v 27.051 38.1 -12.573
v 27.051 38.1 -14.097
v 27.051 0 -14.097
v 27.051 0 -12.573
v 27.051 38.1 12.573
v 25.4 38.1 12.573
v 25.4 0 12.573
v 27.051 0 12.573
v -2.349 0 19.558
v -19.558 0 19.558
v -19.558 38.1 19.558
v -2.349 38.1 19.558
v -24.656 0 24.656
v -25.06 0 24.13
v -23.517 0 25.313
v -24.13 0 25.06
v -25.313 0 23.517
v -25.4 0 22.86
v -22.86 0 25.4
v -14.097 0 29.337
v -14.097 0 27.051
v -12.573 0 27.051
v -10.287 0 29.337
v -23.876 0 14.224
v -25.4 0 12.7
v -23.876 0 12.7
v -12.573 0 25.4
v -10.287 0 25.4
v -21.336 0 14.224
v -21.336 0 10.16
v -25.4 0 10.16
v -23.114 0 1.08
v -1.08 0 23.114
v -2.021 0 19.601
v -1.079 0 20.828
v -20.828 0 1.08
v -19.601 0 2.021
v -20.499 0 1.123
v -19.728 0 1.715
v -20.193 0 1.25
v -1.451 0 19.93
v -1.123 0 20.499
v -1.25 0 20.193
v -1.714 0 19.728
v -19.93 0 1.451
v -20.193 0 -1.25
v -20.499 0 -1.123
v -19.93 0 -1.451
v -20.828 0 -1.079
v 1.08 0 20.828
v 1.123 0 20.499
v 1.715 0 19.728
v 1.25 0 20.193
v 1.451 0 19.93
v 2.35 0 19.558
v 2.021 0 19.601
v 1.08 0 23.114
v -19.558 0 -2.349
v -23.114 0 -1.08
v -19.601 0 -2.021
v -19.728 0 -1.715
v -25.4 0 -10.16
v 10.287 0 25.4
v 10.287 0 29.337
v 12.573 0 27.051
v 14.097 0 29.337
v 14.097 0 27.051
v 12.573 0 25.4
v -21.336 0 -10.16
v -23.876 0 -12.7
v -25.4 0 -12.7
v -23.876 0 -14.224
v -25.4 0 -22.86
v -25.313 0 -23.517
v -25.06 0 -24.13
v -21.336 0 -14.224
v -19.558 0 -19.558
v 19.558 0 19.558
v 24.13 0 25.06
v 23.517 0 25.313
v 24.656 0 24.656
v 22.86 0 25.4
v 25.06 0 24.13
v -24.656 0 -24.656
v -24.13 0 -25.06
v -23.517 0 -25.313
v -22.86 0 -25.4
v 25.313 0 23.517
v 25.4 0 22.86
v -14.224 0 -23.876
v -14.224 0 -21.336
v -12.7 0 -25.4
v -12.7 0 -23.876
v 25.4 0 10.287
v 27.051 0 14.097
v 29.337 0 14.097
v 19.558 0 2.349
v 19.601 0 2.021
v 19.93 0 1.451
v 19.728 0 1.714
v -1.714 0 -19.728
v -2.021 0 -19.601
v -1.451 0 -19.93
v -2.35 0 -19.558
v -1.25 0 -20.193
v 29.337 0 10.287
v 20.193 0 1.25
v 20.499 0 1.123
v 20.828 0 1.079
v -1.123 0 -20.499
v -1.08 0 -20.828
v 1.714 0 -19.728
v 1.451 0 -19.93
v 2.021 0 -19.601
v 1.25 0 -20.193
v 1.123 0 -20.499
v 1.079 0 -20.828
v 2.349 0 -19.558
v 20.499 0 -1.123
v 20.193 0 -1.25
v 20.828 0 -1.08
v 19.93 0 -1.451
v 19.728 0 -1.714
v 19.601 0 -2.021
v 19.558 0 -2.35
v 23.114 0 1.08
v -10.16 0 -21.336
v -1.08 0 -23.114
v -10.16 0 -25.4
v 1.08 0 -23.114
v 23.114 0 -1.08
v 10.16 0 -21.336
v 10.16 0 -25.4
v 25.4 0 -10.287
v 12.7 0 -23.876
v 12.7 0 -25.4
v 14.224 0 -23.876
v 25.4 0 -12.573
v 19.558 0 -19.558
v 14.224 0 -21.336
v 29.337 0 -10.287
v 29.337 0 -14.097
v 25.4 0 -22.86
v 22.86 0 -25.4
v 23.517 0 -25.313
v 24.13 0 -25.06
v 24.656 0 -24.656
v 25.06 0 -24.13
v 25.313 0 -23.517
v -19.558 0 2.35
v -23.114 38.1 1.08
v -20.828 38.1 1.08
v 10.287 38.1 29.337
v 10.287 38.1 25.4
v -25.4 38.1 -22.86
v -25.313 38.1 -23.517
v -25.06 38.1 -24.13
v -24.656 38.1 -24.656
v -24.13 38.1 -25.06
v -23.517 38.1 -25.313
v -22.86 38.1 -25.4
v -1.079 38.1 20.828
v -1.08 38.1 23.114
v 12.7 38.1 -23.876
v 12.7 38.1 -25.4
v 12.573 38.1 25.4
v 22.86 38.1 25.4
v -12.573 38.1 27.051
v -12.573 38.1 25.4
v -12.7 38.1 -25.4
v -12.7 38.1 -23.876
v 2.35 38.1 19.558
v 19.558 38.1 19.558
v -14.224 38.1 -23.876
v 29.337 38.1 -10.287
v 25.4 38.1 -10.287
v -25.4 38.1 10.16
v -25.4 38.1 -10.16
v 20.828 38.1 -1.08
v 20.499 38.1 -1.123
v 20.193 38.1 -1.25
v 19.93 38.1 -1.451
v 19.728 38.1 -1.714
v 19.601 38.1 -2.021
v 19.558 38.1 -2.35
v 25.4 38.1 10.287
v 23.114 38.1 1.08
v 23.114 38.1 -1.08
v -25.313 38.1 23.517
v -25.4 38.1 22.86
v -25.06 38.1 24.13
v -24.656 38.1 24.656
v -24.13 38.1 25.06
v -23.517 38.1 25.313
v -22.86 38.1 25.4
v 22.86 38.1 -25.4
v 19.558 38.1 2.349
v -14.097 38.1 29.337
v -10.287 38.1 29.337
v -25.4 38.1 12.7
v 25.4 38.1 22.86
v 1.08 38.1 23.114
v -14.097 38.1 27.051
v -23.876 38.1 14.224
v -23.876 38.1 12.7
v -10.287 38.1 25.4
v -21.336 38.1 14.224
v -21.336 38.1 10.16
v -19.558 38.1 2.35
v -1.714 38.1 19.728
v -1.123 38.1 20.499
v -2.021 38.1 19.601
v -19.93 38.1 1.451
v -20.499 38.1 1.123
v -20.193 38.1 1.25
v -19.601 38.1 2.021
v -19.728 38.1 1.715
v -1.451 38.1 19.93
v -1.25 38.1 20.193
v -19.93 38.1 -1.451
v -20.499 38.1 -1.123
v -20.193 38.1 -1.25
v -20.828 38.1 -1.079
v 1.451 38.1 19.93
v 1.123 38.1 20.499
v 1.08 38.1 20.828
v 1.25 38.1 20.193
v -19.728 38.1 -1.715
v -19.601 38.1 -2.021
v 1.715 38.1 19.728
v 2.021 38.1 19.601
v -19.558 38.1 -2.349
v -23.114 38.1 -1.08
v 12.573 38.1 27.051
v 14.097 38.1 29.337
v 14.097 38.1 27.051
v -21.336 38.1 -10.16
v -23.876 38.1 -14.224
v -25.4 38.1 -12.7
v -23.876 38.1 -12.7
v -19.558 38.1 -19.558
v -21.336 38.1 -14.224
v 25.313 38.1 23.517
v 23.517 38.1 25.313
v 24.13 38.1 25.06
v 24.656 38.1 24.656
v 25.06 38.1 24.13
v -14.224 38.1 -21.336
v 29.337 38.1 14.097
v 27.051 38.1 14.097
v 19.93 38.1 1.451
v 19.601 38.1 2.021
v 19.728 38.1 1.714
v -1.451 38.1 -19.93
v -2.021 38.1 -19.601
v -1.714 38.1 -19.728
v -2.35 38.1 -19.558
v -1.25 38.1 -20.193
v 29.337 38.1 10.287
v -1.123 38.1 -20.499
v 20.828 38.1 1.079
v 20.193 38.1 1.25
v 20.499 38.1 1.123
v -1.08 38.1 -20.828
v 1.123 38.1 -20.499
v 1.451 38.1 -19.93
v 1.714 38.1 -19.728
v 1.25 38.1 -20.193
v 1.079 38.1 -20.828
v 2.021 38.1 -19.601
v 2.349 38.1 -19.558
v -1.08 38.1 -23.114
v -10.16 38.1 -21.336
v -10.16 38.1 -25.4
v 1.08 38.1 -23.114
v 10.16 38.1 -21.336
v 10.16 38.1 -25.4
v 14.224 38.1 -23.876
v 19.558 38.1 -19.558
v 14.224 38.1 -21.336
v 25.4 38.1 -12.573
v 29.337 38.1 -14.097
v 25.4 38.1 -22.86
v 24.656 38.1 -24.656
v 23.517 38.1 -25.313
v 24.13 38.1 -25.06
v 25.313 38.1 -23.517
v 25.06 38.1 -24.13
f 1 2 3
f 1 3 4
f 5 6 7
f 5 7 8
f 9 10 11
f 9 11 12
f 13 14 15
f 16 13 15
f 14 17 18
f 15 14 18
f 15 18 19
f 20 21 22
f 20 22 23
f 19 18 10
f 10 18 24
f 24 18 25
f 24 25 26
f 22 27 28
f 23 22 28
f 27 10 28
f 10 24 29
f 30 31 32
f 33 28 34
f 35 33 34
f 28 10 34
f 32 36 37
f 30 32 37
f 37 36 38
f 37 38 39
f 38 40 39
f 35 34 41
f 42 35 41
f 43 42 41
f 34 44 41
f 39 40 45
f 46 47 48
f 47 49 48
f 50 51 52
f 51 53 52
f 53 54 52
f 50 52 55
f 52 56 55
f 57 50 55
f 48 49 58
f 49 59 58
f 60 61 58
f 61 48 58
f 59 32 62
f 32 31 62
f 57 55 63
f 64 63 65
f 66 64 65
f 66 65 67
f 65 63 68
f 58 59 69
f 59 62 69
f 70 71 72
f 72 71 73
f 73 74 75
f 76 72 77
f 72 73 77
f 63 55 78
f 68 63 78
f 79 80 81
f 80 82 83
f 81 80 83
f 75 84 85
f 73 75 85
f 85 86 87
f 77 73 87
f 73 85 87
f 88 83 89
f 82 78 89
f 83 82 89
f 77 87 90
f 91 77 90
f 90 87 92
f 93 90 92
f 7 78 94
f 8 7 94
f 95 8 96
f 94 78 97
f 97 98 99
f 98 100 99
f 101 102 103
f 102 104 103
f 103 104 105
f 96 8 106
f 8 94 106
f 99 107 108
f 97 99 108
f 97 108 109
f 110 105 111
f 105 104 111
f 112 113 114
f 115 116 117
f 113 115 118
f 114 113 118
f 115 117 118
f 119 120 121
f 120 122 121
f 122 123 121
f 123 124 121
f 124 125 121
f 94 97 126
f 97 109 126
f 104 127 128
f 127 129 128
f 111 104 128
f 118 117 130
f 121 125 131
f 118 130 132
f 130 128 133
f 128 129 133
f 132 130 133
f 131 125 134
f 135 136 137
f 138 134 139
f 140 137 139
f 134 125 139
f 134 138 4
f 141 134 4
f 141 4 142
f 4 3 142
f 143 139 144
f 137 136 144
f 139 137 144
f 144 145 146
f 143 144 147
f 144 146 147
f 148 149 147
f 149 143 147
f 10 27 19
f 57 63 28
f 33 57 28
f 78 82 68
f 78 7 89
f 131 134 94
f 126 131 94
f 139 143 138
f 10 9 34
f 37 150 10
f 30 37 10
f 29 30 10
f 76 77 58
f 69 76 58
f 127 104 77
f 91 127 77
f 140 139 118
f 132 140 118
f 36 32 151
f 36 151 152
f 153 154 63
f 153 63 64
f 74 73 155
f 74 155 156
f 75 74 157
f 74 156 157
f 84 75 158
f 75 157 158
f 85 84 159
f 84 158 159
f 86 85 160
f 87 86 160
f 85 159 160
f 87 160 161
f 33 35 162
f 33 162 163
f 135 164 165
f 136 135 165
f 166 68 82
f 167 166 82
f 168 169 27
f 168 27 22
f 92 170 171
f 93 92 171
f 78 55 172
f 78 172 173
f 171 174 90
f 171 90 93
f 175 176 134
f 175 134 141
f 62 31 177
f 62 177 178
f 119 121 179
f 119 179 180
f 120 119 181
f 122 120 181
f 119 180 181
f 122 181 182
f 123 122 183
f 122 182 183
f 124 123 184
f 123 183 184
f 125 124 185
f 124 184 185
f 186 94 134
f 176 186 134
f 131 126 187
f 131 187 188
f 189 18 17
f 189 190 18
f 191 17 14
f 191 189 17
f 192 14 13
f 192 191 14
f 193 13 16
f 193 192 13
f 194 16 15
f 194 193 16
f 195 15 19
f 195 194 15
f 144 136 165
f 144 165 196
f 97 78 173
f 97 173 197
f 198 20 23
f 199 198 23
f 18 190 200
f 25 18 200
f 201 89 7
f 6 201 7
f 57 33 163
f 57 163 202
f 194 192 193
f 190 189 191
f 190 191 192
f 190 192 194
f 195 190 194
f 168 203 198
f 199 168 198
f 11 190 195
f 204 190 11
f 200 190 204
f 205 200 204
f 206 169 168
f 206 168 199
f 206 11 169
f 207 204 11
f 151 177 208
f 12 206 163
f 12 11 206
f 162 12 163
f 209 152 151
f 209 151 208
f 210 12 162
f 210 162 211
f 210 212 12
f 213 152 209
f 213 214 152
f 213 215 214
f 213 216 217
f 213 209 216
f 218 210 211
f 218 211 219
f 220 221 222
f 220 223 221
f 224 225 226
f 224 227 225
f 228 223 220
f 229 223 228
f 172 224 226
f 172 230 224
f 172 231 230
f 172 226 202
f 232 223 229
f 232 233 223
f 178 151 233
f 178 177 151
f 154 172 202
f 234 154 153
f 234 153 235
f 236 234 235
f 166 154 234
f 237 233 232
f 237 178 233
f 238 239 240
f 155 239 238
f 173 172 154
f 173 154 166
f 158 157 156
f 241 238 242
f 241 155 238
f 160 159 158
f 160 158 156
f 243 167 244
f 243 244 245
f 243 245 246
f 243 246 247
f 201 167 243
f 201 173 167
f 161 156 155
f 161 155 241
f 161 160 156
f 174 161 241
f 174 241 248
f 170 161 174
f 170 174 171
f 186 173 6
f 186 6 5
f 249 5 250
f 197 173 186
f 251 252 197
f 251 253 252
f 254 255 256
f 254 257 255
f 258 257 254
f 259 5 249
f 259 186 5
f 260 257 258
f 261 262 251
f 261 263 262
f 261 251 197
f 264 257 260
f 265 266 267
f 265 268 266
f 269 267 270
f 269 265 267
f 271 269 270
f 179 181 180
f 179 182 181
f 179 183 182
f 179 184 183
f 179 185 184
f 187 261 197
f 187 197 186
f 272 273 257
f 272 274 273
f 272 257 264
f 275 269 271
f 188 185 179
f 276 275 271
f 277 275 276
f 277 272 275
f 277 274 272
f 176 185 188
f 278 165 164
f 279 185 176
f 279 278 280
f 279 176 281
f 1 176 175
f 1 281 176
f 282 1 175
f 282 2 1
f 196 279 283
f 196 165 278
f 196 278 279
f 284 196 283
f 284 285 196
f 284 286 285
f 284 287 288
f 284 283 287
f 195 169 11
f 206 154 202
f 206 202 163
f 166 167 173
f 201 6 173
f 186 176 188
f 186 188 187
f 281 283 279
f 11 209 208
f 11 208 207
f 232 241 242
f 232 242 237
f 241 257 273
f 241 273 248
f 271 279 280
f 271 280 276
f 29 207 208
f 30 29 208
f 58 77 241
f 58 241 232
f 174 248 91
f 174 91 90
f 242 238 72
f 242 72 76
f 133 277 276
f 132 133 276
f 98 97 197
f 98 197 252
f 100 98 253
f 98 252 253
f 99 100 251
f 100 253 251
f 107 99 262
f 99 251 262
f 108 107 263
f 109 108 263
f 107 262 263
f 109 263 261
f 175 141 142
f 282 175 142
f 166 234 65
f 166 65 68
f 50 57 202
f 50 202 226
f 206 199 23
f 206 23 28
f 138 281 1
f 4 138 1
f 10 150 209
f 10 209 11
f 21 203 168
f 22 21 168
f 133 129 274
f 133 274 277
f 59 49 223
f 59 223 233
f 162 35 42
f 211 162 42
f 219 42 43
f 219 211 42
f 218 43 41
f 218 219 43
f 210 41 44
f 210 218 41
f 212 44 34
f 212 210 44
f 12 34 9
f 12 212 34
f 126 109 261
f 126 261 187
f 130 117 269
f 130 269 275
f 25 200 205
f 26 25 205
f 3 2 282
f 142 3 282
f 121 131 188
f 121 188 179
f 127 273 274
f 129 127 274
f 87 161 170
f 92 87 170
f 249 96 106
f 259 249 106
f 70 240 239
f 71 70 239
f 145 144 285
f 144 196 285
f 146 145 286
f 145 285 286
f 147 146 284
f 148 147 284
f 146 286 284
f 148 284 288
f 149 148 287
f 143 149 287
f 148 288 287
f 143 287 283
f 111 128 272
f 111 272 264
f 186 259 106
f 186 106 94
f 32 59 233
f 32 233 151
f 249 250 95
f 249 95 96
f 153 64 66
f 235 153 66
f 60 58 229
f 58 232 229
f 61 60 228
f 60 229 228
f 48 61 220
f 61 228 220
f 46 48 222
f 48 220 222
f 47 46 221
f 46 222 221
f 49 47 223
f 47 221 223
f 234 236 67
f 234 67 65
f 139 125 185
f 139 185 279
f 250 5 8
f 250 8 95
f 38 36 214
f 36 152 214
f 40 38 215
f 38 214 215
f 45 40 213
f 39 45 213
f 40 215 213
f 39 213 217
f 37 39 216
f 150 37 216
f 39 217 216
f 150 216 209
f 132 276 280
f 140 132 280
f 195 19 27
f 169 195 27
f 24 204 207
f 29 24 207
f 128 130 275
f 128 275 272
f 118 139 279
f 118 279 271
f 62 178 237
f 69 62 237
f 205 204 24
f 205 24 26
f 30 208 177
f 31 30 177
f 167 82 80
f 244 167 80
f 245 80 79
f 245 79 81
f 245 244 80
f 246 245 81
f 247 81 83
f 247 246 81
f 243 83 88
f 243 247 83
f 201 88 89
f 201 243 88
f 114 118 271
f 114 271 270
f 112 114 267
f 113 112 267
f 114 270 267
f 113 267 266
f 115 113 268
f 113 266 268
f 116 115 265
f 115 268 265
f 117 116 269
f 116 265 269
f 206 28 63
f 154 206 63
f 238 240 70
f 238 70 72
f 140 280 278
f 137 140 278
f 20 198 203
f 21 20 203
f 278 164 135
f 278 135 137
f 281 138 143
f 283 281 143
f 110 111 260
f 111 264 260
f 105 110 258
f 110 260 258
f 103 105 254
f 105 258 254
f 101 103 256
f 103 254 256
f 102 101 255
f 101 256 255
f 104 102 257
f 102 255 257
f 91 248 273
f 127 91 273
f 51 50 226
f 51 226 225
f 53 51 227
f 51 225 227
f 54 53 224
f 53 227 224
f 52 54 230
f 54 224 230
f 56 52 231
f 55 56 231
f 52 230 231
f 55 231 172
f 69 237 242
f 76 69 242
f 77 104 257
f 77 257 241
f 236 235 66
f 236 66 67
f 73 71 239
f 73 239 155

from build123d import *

# Parameters (mm, degrees)
SKETCH1_W           = 50.8
SKETCH1_H           = 50.8
BOSS_EXTRUDE1_DEPTH = 38.1
FILLET1_R           = 2.54
FILLET2_R           = 1.27
SKETCH3_W           = 1.524
SKETCH3_H           = 2.54
SKETCH3_W_2         = 2.54
SKETCH3_H_2         = 1.524
CUT_EXTRUDE1_DEPTH  = 53.363441445
SKETCH5_W           = 2.286
SKETCH5_H           = 2.286
SKETCH5_H_2         = 1.651
SKETCH5_W_2         = 1.524
SKETCH5_H_3         = 1.524
SKETCH5_W_3         = 1.651
BOSS_EXTRUDE2_DEPTH = 38.1


with BuildPart() as part:
    # Sketch1 → Boss-Extrude1 (new body)
    with BuildSketch(Plane(origin=(0, 0, 0), x_dir=(1, 0, 0), z_dir=(0, 1, 0))):
        Rectangle(SKETCH1_W, SKETCH1_H)
        Polygon((-1.0795, -19.558), (-1.0795, -23.114), (1.0795, -23.114), (1.0795, -19.558), (19.558, -19.558), (19.558, -1.0795), (23.114, -1.0795), (23.114, 1.0795), (19.558, 1.0795), (19.558, 19.558), (1.0795, 19.558), (1.0795, 23.114), (-1.0795, 23.114), (-1.0795, 19.558), (-19.558, 19.558), (-19.558, 1.0795), (-23.114, 1.0795), (-23.114, -1.0795), (-19.558, -1.0795), (-19.558, -19.558), align=None, mode=Mode.SUBTRACT)
    extrude(amount=BOSS_EXTRUDE1_DEPTH)

    # Fillet1
    fillet1_edges = [part.edges().sort_by_distance(p)[0] for p in [
        (-25.4, 19.05, -25.4),
        (25.4, 19.05, -25.4),
        (25.4, 19.05, 25.4),
        (-25.4, 19.05, 25.4),
    ]]
    fillet(fillet1_edges, radius=FILLET1_R)

    # Fillet2
    fillet2_edges = [part.edges().sort_by_distance(p)[0] for p in [
        (1.0795, 19.05, 19.558),
        (19.558, 19.05, 1.0795),
        (19.558, 19.05, -1.0795),
        (1.0795, 19.05, -19.558),
        (-1.0795, 19.05, -19.558),
        (-19.558, 19.05, -1.0795),
        (-19.558, 19.05, 1.0795),
        (-1.0795, 19.05, 19.558),
    ]]
    fillet(fillet2_edges, radius=FILLET2_R)

    # Sketch3 → Cut-Extrude1 (cut, through all)
    with BuildSketch(Plane(origin=(0, 38.1, 0), x_dir=(1, 0, 0), z_dir=(0, 1, 0))):
        with Locations((-24.638, 11.43)):
            Rectangle(SKETCH3_W, SKETCH3_H)
        with Locations((-22.606, 11.43)):
            Rectangle(SKETCH3_W_2, SKETCH3_H)
        with Locations((-22.606, 13.462)):
            Rectangle(SKETCH3_W_2, SKETCH3_H_2)
        with Locations((-24.638, -11.43)):
            Rectangle(SKETCH3_W, SKETCH3_H)
        with Locations((-22.606, -11.43)):
            Rectangle(SKETCH3_W_2, SKETCH3_H)
        with Locations((-22.606, -13.462)):
            Rectangle(SKETCH3_W_2, SKETCH3_H_2)
        with Locations((-11.43, 24.638)):
            Rectangle(SKETCH3_W_2, SKETCH3_H_2)
        with Locations((-11.43, 22.606)):
            Rectangle(SKETCH3_W_2, SKETCH3_H)
        with Locations((-13.462, 22.606)):
            Rectangle(SKETCH3_W, SKETCH3_H)
        with Locations((11.43, 24.638)):
            Rectangle(SKETCH3_W_2, SKETCH3_H_2)
        with Locations((11.43, 22.606)):
            Rectangle(SKETCH3_W_2, SKETCH3_H)
        with Locations((13.462, 22.606)):
            Rectangle(SKETCH3_W, SKETCH3_H)
    extrude(amount=-CUT_EXTRUDE1_DEPTH, mode=Mode.SUBTRACT)

    # Sketch5 → Boss-Extrude2 (add)
    with BuildSketch(Plane(origin=(0, 38.1, 0), x_dir=(1, 0, 0), z_dir=(0, 1, 0))):
        with Locations((-11.43, -28.194)):
            Rectangle(SKETCH5_W, SKETCH5_H)
        with Locations((-11.43, -26.2255)):
            Rectangle(SKETCH5_W, SKETCH5_H_2)
        with Locations((-13.335, -28.194)):
            Rectangle(SKETCH5_W_2, SKETCH5_H)
        with Locations((11.43, -28.194)):
            Rectangle(SKETCH5_W, SKETCH5_H)
        with Locations((13.335, -28.194)):
            Rectangle(SKETCH5_W_2, SKETCH5_H)
        with Locations((11.43, -26.2255)):
            Rectangle(SKETCH5_W, SKETCH5_H_2)
        with Locations((28.194, -11.43)):
            Rectangle(SKETCH5_W, SKETCH5_H)
        with Locations((28.194, -13.335)):
            Rectangle(SKETCH5_W, SKETCH5_H_3)
        with Locations((26.2255, -11.43)):
            Rectangle(SKETCH5_W_3, SKETCH5_H)
        with Locations((28.194, 13.335)):
            Rectangle(SKETCH5_W, SKETCH5_H_3)
        with Locations((28.194, 11.43)):
            Rectangle(SKETCH5_W, SKETCH5_H)
        with Locations((26.2255, 11.43)):
            Rectangle(SKETCH5_W_3, SKETCH5_H)
    extrude(amount=-BOSS_EXTRUDE2_DEPTH)


solid = part.part
